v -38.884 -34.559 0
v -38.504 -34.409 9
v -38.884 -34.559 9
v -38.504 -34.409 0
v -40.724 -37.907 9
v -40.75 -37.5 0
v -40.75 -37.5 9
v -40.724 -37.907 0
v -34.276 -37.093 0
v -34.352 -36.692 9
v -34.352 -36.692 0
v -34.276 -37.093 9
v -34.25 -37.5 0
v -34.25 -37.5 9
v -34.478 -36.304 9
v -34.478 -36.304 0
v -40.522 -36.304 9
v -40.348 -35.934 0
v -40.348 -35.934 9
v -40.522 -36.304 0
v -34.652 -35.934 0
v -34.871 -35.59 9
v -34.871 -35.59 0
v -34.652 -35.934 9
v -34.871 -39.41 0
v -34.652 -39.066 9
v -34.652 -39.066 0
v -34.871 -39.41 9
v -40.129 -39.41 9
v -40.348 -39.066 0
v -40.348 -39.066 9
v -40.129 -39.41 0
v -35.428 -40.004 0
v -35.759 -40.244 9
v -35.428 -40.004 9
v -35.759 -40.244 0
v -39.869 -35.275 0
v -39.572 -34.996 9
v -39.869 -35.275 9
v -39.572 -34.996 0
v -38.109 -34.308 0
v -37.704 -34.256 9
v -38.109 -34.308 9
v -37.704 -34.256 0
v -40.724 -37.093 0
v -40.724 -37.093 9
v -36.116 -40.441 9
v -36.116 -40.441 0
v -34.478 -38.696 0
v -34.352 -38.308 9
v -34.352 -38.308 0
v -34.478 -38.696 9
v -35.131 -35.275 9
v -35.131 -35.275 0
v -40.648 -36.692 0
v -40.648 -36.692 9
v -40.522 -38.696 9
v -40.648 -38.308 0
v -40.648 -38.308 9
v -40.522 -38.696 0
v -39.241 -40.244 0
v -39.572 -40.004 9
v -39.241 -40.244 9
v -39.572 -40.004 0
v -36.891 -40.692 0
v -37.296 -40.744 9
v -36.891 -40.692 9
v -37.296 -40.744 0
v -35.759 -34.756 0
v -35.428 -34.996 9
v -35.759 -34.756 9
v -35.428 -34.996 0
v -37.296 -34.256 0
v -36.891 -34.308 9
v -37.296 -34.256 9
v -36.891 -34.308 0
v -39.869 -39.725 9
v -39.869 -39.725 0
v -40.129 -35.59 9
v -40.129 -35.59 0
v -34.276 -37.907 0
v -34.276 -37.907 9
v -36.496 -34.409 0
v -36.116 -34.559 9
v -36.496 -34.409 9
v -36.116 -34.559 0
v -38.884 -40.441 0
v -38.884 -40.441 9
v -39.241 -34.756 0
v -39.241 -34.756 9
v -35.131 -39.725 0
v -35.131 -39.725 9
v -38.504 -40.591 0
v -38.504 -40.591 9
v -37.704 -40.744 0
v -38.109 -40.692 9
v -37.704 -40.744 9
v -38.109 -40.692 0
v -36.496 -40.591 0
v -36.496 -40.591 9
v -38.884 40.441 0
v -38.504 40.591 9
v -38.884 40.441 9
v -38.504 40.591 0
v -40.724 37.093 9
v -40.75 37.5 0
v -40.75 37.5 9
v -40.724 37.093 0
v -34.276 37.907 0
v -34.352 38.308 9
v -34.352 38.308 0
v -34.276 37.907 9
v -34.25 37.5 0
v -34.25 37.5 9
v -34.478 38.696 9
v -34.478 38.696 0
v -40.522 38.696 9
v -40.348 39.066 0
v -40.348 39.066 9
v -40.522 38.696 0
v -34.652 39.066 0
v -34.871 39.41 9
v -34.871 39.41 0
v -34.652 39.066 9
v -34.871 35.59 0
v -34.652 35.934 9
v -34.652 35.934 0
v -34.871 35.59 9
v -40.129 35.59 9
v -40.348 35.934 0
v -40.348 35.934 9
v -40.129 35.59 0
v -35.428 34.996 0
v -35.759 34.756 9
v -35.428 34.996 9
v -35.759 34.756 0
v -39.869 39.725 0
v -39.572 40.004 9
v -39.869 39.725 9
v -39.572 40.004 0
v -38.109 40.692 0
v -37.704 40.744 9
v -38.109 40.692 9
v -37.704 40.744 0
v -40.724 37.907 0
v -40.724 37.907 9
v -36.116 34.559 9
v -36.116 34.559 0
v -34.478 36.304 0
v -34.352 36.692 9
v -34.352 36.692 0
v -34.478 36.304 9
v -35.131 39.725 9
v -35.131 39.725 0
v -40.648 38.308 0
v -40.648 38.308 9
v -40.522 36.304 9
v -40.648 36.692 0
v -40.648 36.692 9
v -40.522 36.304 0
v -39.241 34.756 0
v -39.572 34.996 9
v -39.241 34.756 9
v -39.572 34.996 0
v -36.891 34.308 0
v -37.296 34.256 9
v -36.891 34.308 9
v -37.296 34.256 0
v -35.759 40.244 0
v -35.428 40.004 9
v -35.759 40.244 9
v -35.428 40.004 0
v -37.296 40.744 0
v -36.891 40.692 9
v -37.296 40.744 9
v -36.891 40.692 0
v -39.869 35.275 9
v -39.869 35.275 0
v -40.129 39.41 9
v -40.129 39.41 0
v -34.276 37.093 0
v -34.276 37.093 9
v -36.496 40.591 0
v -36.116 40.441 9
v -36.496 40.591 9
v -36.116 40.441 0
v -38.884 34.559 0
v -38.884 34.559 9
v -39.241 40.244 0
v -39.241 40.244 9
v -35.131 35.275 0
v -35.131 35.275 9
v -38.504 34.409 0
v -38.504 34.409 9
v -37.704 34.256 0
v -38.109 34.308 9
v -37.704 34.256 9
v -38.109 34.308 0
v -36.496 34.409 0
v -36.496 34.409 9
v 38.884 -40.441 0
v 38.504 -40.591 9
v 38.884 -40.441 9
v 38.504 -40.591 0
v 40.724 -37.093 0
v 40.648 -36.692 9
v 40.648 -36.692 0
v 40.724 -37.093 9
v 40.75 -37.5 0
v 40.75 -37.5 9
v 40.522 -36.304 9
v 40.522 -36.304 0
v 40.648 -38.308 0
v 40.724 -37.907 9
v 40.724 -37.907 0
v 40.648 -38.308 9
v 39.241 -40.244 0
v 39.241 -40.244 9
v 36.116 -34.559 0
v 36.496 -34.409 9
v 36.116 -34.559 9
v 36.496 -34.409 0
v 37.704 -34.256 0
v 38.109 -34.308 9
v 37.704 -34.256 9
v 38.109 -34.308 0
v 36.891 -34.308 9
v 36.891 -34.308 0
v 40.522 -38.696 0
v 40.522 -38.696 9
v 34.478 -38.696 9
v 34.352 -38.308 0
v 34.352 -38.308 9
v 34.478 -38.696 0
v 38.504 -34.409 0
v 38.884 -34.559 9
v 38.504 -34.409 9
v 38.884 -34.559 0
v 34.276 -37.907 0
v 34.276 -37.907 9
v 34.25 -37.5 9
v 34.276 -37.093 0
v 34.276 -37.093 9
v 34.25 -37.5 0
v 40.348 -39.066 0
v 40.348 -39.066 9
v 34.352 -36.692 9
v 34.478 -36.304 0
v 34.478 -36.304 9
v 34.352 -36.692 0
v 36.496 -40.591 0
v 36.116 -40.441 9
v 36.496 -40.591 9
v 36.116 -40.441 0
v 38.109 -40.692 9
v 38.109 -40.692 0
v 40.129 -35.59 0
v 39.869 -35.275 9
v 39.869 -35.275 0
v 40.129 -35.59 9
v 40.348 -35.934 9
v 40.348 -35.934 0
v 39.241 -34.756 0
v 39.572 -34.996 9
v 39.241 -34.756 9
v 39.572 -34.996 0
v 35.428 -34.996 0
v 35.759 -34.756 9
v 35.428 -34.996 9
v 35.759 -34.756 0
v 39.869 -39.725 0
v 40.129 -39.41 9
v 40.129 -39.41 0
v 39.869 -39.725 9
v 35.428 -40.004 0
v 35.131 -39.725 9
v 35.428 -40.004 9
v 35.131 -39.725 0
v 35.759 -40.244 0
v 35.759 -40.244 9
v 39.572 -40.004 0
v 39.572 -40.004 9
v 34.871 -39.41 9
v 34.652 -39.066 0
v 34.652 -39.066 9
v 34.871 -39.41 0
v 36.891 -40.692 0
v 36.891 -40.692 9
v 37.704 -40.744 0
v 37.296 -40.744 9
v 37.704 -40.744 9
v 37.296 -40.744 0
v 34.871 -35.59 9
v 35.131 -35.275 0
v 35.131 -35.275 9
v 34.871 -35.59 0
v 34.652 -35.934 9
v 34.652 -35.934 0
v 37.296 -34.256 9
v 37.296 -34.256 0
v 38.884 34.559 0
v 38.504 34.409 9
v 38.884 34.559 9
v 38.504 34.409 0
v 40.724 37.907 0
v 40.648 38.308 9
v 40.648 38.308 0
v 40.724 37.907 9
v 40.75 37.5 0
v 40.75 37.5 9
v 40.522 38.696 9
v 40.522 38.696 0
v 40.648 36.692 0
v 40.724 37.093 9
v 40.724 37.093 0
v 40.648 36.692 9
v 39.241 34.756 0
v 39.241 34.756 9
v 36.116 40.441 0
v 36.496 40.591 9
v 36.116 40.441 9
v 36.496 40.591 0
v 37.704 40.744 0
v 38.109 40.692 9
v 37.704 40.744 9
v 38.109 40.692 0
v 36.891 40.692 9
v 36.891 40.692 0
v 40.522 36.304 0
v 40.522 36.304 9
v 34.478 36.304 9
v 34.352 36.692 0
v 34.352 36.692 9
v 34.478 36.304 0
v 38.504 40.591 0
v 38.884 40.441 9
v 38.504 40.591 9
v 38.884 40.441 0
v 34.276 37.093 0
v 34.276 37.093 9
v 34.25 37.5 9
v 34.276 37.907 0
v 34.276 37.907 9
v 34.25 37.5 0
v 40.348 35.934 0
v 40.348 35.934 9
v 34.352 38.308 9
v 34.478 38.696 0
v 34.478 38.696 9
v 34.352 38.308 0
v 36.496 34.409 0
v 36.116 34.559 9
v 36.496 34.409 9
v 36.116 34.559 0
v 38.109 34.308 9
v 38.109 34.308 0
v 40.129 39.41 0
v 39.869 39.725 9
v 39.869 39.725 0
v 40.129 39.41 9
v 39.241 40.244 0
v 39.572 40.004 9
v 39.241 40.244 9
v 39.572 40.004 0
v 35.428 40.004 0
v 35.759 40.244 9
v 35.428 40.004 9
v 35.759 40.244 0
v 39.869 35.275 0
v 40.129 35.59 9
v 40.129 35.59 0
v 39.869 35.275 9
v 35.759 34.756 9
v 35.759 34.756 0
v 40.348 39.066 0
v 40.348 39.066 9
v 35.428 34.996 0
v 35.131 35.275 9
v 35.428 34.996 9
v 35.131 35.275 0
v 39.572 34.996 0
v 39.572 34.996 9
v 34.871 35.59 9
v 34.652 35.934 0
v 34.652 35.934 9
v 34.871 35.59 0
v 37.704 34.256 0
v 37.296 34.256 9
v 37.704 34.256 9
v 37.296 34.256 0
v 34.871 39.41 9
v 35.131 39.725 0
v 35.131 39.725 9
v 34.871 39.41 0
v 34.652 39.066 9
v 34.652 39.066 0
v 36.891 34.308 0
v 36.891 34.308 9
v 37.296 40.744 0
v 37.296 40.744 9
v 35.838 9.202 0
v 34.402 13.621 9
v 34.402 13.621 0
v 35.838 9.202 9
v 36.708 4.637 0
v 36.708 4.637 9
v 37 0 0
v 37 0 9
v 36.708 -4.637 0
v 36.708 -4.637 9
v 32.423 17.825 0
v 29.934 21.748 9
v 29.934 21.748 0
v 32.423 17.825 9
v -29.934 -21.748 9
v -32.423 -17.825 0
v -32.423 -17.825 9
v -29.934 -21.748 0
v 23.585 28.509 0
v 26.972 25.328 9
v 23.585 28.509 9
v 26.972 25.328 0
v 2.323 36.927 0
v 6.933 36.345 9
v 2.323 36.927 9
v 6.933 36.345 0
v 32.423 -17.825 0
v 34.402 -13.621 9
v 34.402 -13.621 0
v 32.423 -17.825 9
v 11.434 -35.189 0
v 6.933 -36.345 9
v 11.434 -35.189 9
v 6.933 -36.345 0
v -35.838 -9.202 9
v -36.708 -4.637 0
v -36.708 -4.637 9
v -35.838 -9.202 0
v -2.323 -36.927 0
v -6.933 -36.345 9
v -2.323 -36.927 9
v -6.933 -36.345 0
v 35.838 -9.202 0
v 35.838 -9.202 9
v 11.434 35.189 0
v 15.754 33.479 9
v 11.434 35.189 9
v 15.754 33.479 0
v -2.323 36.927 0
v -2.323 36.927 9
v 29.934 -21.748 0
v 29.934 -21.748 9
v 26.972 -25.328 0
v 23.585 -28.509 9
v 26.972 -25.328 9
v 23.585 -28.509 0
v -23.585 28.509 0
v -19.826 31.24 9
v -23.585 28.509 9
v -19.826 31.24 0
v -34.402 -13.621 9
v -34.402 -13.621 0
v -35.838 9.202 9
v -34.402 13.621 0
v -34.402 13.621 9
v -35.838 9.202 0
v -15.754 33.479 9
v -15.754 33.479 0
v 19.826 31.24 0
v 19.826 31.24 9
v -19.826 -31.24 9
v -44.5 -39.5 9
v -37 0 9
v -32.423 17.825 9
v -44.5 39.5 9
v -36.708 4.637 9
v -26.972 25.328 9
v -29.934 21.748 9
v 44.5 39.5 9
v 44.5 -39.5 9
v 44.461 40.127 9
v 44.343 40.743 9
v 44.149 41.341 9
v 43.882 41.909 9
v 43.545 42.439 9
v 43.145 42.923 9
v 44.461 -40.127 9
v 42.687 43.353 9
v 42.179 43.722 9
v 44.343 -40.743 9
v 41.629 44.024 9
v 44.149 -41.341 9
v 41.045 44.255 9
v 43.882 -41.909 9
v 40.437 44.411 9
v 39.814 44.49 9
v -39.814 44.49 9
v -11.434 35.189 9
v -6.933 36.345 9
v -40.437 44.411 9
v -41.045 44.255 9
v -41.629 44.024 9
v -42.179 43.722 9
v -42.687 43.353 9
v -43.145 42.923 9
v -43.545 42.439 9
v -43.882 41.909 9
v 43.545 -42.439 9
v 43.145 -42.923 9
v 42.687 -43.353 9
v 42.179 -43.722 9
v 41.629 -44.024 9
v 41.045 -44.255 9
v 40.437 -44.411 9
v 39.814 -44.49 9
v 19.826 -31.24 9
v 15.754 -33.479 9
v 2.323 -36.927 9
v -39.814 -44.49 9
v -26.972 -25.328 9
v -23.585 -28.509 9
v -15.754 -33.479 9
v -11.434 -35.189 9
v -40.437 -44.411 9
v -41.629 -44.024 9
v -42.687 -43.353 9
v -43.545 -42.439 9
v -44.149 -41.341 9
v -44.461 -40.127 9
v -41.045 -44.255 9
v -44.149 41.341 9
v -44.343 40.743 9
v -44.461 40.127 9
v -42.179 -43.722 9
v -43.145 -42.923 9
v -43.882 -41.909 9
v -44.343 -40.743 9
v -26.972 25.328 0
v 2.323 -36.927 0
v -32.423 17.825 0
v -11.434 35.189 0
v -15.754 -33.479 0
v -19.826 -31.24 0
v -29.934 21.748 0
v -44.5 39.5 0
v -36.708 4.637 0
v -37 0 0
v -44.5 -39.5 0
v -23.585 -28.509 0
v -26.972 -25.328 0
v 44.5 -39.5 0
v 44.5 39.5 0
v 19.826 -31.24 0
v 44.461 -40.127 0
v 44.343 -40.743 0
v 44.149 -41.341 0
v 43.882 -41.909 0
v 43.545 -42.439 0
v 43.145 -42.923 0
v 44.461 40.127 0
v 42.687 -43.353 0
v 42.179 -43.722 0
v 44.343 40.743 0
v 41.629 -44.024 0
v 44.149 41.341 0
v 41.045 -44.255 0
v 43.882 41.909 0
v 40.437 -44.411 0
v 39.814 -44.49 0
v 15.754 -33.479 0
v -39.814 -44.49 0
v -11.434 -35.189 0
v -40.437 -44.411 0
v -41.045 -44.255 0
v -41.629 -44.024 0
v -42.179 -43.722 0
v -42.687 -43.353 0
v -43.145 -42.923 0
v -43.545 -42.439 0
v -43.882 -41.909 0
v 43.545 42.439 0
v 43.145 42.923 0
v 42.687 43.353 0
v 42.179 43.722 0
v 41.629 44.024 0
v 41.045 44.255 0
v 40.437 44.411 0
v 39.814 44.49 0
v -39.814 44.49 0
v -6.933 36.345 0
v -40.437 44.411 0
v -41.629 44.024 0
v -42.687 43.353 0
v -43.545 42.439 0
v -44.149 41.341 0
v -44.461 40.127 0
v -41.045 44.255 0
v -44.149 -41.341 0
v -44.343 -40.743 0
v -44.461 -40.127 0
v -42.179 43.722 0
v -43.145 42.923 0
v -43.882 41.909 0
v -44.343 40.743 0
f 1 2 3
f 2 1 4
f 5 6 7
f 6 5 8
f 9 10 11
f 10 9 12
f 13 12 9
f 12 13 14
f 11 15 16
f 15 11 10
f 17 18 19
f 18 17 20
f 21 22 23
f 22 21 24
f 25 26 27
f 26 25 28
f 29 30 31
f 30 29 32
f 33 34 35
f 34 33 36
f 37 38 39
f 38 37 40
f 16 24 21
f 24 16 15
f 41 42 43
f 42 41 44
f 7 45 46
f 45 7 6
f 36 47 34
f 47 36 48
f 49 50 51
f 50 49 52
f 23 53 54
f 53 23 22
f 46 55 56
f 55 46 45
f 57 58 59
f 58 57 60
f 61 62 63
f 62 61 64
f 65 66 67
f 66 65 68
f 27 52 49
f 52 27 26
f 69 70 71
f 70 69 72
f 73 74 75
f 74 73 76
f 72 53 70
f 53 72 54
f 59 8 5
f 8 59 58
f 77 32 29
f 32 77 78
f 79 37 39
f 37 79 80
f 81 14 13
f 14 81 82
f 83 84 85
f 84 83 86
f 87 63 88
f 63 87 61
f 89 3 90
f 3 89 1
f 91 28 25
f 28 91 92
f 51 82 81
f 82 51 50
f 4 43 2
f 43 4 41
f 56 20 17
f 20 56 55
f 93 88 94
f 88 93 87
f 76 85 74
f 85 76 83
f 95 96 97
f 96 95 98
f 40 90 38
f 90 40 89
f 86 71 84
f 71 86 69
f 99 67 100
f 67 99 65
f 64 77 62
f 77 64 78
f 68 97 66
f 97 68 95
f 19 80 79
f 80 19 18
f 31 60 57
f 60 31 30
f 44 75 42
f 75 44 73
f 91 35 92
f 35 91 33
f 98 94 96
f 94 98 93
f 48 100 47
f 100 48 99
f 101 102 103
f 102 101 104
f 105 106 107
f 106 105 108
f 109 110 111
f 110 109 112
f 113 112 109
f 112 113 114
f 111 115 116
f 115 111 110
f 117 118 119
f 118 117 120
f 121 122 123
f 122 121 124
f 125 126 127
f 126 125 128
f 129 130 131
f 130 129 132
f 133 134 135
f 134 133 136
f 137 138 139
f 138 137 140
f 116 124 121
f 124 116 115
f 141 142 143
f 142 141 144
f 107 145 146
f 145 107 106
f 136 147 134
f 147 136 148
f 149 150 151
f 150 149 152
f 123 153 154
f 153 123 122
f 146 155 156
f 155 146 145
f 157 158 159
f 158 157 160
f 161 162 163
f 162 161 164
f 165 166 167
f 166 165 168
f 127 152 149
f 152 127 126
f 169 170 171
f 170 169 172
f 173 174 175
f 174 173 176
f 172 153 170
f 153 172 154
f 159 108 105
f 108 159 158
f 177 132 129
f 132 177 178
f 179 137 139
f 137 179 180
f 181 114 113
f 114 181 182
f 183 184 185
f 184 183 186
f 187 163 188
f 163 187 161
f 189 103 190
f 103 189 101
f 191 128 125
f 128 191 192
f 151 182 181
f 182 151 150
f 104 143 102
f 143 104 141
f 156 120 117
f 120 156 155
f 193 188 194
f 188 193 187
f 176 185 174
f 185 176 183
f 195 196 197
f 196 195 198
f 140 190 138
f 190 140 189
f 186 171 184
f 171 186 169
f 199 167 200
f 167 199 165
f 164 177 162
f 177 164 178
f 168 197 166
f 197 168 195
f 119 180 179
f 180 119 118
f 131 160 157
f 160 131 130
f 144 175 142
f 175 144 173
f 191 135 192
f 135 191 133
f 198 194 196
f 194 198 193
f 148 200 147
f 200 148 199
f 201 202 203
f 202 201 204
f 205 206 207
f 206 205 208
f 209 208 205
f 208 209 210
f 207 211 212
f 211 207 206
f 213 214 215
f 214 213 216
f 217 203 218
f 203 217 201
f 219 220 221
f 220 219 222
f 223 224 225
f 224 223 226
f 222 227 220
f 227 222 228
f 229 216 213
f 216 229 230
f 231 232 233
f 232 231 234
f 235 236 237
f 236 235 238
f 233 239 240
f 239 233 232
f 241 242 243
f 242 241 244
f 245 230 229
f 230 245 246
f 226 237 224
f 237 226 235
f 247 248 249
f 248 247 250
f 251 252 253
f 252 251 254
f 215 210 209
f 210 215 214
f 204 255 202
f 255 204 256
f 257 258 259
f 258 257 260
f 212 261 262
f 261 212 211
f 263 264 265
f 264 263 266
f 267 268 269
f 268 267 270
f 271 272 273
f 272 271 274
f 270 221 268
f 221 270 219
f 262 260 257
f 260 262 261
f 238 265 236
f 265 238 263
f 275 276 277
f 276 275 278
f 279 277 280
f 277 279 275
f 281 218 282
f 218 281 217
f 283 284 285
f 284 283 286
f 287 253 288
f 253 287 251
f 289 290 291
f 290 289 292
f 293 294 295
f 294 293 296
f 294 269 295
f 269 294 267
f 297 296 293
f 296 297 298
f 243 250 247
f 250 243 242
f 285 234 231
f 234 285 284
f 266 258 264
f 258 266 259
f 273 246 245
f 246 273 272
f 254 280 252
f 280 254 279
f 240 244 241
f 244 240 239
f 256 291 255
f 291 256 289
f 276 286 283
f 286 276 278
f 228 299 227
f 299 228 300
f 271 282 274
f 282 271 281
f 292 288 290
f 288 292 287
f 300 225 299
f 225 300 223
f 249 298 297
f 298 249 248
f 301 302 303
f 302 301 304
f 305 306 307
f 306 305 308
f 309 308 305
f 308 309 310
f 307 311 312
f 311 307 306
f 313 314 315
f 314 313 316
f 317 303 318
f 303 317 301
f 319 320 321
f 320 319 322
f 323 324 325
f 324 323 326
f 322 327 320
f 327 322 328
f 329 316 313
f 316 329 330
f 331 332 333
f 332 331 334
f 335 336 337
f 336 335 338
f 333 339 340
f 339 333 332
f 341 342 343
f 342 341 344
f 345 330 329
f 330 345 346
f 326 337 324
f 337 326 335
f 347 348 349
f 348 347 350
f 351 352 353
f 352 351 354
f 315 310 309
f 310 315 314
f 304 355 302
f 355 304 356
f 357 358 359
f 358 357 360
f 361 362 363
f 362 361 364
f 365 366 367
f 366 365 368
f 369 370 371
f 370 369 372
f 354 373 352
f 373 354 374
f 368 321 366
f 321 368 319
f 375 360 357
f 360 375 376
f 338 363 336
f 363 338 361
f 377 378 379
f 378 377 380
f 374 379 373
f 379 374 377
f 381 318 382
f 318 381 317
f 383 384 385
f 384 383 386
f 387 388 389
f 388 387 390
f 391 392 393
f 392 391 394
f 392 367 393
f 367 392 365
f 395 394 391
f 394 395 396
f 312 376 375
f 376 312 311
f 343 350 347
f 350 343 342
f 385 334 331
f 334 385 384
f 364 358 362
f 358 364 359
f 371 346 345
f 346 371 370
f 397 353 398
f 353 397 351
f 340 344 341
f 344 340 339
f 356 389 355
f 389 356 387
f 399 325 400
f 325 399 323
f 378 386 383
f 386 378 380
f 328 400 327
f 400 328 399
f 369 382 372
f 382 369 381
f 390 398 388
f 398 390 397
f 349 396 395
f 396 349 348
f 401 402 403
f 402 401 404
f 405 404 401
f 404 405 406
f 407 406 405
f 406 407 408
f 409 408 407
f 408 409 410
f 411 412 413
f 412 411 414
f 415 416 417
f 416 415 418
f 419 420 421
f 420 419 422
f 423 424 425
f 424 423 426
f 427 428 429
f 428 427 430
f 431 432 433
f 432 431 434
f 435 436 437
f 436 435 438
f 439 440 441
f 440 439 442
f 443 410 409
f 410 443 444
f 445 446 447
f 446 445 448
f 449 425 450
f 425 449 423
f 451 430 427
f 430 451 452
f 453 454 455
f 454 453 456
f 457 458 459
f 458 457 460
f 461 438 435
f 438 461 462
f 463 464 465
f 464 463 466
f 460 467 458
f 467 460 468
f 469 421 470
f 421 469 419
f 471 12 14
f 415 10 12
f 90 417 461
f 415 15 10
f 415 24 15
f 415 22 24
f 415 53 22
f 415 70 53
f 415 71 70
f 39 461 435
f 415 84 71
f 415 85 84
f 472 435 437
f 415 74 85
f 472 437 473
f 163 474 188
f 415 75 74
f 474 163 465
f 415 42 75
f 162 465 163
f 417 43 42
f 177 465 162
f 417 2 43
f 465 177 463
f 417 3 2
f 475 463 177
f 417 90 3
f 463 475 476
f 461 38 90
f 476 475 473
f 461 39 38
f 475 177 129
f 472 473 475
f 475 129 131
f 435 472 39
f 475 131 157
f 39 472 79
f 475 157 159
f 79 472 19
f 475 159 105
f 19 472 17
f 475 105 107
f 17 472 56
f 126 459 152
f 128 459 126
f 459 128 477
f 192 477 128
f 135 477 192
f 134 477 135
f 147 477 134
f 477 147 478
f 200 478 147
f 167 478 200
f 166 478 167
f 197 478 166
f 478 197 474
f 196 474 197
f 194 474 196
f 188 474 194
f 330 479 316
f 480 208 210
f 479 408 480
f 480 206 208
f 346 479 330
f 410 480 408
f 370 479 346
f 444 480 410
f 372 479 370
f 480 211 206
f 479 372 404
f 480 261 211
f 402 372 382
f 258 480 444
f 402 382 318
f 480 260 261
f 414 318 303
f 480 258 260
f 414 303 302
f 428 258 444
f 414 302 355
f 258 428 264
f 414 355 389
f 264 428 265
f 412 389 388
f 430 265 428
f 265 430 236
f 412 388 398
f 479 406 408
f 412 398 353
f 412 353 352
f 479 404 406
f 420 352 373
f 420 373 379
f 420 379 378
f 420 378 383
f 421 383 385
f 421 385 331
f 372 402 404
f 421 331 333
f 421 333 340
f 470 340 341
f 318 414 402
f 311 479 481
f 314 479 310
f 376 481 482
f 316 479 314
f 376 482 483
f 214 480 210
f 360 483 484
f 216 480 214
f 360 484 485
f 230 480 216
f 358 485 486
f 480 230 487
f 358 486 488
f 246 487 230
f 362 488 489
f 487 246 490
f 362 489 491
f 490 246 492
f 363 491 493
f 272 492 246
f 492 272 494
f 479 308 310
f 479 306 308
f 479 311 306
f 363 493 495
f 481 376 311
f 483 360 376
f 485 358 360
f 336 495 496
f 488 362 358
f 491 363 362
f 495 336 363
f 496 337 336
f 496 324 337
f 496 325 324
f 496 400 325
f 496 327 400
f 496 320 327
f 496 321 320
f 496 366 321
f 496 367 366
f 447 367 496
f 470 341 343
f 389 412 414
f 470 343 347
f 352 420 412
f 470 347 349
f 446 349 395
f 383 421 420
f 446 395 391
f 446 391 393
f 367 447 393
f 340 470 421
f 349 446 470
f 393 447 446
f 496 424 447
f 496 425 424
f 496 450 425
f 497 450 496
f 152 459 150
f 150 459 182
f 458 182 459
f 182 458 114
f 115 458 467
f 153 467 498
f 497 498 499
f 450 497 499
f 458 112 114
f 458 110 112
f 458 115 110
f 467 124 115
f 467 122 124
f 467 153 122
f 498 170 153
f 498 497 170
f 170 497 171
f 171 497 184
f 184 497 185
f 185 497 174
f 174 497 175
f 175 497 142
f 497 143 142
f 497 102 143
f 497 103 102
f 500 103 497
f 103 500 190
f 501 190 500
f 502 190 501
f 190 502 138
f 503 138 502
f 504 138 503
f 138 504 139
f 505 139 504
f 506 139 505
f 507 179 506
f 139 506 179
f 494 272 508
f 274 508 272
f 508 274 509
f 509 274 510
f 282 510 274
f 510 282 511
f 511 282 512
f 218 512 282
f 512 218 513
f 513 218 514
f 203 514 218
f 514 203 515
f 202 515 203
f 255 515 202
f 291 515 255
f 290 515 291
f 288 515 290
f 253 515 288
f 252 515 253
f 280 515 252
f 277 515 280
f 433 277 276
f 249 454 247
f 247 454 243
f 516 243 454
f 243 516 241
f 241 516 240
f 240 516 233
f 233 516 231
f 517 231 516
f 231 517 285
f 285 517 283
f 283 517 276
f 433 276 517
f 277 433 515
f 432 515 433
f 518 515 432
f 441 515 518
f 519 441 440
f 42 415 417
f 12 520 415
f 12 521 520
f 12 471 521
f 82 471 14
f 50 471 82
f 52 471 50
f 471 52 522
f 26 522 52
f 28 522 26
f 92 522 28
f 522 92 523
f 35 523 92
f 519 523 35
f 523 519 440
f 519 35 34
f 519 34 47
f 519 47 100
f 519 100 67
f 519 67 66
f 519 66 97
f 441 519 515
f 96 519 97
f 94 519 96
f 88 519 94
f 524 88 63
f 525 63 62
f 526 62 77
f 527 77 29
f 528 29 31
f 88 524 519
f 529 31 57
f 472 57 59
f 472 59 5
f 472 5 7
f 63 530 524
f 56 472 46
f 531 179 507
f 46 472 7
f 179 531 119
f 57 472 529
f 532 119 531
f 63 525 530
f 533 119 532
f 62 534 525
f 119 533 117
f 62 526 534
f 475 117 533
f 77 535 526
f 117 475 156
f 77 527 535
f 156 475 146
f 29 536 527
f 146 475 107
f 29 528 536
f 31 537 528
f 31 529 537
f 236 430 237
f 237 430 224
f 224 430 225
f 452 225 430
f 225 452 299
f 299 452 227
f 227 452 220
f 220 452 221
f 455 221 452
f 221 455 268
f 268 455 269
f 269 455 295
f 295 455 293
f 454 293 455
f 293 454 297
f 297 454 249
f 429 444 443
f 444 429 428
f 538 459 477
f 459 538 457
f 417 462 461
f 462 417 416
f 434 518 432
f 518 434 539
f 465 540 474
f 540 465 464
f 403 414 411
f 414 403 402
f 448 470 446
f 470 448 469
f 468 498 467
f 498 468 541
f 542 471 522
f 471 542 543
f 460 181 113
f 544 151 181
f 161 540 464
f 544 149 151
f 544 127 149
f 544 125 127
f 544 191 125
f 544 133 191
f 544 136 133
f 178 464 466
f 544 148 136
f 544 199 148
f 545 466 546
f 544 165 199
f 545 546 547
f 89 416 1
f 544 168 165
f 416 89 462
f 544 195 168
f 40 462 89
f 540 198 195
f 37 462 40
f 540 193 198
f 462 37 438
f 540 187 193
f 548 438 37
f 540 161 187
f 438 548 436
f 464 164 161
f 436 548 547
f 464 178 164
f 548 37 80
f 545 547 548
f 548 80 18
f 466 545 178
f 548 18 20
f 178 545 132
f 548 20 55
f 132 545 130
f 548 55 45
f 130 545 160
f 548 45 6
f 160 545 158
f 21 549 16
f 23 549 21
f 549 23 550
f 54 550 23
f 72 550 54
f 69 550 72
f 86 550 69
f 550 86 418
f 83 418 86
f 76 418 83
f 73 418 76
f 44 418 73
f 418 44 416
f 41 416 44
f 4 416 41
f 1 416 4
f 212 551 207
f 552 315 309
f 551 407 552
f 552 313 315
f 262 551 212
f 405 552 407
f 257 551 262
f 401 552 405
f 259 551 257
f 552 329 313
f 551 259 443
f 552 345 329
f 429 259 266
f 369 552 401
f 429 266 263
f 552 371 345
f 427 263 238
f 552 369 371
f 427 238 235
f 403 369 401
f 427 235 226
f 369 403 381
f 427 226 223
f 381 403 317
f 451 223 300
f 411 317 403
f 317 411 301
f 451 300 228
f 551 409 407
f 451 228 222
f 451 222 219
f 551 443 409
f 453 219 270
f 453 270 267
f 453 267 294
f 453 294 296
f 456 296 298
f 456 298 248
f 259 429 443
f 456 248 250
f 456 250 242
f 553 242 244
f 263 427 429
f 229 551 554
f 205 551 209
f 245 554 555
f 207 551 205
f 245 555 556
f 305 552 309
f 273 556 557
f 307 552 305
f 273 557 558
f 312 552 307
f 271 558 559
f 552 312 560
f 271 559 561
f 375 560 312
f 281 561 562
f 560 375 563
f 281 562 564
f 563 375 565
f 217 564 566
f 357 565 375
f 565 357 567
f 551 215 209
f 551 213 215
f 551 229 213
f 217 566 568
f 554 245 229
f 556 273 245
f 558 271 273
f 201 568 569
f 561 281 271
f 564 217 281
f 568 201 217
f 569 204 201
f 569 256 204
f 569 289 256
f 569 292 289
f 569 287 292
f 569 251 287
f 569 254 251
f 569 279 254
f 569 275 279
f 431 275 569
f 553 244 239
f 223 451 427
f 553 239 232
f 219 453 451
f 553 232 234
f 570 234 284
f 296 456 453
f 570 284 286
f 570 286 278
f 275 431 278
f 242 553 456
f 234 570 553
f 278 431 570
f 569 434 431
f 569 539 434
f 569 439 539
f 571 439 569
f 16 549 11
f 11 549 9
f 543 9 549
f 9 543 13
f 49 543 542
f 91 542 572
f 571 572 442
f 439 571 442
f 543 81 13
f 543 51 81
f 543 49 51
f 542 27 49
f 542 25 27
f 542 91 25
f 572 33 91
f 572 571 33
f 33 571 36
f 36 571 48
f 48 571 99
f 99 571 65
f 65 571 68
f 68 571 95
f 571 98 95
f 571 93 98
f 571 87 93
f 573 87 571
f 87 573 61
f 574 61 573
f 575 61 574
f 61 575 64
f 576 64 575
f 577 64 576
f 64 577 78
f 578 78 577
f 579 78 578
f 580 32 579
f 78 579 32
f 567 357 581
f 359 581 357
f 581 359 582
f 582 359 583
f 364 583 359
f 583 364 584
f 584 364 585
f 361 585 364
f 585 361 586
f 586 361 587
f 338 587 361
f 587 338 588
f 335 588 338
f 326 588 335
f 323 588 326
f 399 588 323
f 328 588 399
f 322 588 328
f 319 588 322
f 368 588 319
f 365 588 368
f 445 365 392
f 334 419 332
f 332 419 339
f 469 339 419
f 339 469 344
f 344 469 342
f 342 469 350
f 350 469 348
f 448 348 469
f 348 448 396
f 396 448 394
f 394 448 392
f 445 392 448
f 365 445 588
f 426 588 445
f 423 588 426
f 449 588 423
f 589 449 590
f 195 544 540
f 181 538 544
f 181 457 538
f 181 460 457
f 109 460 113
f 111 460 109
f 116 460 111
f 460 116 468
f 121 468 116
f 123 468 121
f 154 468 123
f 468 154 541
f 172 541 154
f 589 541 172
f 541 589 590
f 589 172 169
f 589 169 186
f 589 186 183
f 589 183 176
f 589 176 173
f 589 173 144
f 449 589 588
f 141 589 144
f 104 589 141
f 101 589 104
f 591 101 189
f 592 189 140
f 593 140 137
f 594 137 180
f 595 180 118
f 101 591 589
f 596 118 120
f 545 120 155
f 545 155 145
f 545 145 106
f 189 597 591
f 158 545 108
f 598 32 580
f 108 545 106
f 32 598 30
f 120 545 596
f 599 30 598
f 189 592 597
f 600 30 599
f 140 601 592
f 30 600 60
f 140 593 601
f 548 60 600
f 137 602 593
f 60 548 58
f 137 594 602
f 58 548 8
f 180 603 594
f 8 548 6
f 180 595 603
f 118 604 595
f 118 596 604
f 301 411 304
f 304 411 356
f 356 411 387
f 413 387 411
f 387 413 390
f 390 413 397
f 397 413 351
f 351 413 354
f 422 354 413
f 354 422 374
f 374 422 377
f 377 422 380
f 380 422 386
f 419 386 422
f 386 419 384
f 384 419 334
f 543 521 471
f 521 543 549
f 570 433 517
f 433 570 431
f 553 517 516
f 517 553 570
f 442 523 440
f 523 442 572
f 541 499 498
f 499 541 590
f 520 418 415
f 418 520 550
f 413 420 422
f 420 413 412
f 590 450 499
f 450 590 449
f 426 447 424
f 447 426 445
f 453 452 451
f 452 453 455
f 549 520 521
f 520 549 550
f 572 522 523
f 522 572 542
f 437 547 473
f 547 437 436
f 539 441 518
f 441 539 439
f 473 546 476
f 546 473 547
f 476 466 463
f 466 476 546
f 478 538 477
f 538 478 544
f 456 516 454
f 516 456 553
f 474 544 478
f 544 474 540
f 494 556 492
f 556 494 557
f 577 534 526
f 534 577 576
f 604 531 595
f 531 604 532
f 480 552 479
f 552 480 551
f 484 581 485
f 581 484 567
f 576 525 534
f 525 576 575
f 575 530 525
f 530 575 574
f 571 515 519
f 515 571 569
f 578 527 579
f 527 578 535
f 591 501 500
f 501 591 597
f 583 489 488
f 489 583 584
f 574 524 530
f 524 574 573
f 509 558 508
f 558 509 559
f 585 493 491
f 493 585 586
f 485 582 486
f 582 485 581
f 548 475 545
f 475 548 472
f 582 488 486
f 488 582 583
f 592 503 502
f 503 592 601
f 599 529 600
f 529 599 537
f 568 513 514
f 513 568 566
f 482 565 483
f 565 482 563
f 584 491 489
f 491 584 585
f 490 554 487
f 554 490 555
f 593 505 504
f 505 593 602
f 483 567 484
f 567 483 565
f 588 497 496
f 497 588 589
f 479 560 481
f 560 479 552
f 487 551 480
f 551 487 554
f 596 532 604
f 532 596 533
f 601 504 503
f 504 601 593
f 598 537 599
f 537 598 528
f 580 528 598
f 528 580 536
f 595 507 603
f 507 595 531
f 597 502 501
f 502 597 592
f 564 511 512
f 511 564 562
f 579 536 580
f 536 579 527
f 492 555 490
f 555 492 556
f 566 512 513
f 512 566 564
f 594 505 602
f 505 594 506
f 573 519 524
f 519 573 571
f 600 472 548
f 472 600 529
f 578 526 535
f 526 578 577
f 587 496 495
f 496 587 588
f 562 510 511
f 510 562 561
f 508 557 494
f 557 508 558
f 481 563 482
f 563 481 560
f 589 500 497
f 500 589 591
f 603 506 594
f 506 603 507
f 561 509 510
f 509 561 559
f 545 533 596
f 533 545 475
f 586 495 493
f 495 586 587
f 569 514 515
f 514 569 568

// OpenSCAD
$fn = 50;

difference() {
	union() {
		hull() {
			translate(v = [-39.5, 39.5, 0]) {
				cylinder(h = 9, r = 5);
			}
			translate(v = [39.5, 39.5, 0]) {
				cylinder(h = 9, r = 5);
			}
			translate(v = [-39.5, -39.5, 0]) {
				cylinder(h = 9, r = 5);
			}
			translate(v = [39.5, -39.5, 0]) {
				cylinder(h = 9, r = 5);
			}
		}
	}
	union() {
		translate(v = [-37.5, -37.5, -100.0]) {
			cylinder(h = 200, r = 3.25);
		}
		translate(v = [-37.5, 37.5, -100.0]) {
			cylinder(h = 200, r = 3.25);
		}
		translate(v = [37.5, -37.5, -100.0]) {
			cylinder(h = 200, r = 3.25);
		}
		translate(v = [37.5, 37.5, -100.0]) {
			cylinder(h = 200, r = 3.25);
		}
		translate(v = [-37.5, -37.5, -100.0]) {
			cylinder(h = 200, r = 1.8);
		}
		translate(v = [-37.5, 37.5, -100.0]) {
			cylinder(h = 200, r = 1.8);
		}
		translate(v = [37.5, -37.5, -100.0]) {
			cylinder(h = 200, r = 1.8);
		}
		translate(v = [37.5, 37.5, -100.0]) {
			cylinder(h = 200, r = 1.8);
		}
		cylinder(h = 9, r = 37.0);
	}
}
